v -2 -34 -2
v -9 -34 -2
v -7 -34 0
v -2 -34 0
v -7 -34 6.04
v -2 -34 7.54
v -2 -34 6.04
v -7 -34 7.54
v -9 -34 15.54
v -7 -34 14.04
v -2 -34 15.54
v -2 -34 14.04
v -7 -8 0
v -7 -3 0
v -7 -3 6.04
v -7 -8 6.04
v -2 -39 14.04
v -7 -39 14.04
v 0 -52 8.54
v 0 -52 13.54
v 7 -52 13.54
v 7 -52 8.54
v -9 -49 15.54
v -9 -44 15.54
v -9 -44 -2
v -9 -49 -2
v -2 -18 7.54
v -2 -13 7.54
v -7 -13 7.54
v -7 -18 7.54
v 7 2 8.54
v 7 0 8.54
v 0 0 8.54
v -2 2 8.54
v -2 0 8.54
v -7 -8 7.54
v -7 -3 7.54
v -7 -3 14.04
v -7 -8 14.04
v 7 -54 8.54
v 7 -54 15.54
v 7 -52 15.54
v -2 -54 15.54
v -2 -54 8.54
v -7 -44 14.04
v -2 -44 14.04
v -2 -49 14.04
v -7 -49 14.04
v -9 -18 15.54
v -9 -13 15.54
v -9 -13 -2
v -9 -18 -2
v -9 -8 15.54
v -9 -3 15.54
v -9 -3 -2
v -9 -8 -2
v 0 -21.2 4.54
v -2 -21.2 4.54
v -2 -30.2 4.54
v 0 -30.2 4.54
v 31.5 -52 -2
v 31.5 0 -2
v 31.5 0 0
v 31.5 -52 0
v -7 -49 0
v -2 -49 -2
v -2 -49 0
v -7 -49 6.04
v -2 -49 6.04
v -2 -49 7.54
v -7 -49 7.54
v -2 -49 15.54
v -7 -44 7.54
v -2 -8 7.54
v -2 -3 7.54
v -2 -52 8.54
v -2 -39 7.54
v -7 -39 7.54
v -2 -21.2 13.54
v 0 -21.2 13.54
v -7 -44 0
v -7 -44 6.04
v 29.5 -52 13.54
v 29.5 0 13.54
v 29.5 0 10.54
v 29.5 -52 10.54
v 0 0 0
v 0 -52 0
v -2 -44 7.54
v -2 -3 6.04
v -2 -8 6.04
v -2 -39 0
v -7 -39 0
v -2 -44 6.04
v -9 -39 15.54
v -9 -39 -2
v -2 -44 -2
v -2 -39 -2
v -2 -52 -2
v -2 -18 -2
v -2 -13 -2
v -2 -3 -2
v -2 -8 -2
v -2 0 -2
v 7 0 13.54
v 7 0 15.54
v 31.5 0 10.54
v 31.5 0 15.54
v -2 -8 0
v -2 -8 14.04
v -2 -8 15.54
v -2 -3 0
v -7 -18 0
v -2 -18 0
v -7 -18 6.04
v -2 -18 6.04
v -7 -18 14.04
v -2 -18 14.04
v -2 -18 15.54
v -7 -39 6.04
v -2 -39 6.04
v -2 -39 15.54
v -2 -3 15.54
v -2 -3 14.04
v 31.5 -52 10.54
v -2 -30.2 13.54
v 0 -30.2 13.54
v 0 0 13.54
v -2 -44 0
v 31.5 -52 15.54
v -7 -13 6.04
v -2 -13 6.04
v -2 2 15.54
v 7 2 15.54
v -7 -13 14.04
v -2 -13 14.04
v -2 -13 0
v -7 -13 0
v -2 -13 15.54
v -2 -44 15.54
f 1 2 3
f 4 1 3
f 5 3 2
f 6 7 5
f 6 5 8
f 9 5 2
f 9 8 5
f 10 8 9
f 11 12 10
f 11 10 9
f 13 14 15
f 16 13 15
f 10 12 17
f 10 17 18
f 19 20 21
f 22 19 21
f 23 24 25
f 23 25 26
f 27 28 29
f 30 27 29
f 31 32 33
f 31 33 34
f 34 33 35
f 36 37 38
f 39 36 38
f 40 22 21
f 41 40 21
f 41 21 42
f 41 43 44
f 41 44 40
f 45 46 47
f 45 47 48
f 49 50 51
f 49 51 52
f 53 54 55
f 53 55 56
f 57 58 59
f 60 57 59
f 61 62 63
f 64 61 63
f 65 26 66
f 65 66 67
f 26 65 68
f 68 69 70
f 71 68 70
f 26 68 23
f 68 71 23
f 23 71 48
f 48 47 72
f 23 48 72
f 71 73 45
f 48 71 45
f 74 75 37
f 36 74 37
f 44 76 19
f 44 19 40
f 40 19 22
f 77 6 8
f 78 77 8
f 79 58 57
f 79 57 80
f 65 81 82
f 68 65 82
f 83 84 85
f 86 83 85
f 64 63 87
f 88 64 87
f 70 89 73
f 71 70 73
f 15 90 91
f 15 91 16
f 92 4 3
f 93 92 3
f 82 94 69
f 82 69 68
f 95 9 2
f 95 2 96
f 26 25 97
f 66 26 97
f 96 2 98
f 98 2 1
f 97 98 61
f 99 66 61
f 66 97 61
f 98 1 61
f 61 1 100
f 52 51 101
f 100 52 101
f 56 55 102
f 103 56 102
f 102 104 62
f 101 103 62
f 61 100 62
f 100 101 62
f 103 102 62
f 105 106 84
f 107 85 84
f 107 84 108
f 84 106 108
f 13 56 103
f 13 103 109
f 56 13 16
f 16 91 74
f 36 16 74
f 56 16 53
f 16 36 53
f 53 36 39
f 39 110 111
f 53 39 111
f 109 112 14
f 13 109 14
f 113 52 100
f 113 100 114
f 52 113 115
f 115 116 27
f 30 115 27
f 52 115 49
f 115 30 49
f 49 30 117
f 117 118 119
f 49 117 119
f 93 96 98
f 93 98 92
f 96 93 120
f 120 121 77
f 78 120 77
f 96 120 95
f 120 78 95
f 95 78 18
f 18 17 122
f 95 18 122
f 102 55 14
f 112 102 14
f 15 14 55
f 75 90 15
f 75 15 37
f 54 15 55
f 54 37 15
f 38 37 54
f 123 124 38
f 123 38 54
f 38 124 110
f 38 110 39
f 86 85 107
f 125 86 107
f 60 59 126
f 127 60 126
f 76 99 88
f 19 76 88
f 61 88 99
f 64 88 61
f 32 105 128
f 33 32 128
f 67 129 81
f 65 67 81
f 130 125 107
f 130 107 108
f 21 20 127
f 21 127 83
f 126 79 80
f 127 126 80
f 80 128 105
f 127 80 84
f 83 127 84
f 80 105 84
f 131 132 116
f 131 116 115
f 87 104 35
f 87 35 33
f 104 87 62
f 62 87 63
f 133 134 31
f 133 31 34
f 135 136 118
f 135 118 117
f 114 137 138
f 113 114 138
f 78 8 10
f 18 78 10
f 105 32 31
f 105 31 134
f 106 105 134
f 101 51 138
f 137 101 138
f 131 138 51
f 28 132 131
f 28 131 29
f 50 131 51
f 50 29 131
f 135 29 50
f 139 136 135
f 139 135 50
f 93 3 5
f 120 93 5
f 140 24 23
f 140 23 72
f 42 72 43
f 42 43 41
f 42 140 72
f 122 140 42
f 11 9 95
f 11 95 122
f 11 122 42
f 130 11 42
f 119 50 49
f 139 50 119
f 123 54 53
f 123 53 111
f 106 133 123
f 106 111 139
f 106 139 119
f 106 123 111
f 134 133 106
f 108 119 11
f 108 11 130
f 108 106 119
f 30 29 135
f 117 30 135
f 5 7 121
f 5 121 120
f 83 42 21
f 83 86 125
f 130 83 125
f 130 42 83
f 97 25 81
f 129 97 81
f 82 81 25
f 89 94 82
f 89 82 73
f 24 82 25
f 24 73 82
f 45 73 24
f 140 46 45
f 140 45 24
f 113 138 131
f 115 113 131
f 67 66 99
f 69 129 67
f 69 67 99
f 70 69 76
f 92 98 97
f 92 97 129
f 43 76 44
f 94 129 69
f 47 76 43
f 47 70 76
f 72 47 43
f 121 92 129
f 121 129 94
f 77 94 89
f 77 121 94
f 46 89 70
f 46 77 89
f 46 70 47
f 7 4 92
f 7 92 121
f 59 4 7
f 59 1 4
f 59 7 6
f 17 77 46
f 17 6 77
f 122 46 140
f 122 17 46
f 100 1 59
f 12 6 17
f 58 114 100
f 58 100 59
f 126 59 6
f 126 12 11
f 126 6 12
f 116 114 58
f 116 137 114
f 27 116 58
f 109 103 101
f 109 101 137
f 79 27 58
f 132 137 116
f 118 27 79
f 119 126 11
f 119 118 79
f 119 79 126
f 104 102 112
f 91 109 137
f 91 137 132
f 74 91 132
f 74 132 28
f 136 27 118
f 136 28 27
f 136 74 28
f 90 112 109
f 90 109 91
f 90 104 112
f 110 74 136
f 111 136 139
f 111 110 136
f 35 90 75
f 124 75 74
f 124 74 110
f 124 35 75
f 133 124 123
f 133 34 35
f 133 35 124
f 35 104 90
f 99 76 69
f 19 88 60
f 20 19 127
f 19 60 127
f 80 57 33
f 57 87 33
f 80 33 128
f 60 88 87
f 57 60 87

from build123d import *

# Parameters (mm, degrees)
F1_DEPTH  = 52
F2_W      = 9
F2_H      = 9
F3_DEPTH  = 2
F5_W      = 9
F5_H      = 7
F6_DEPTH  = 2
F7_W      = 9
F7_H      = 7
F8_DEPTH  = 2
F4_W      = 5
F4_H      = 17.54
F9_DEPTH  = 7
F10_W     = 5
F10_H     = 6.5
F10_H_2   = 6.04
F11_DEPTH = 51.001


with BuildPart() as f1:
    # F0 (on Front) → F1 (new body)
    with BuildSketch(Plane.XZ):
        Polygon((31.5, 0), (0, 0), (0, 13.54), (29.5, 13.54), (29.5, 10.54), (31.5, 10.54), (31.5, 15.54), (-2, 15.54), (-2, -2), (31.5, -2), align=None)
    extrude(amount=F1_DEPTH)

    # F2 (on face) → F3 (cut, through all)
    with BuildSketch(Plane(origin=(-2, 0, 0), x_dir=(0, -1, 0), z_dir=(-1, 0, 0))):
        with Locations((25.7, 9.04)):
            Rectangle(F2_W, F2_H)
    extrude(amount=-F3_DEPTH, mode=Mode.SUBTRACT)

    # F5 (on face) → F6 (join)
    with BuildSketch(Plane(origin=(0, 0, 0), x_dir=(-1, 0, 0), z_dir=(0, 1, 0))):
        with Locations((-2.5, 12.04)):
            Rectangle(F5_W, F5_H)
    extrude(amount=F6_DEPTH)

    # F7 (on face) → F8 (join)
    with BuildSketch(Plane.XZ.offset(52)):
        with Locations((2.5, 12.04)):
            Rectangle(F7_W, F7_H)
    extrude(amount=F8_DEPTH)

    # F4 (on face) → F9 (join)
    with BuildSketch(Plane(origin=(-2, 0, 0), x_dir=(0, -1, 0), z_dir=(-1, 0, 0))):
        with Locations((15.5, 6.77)):
            Rectangle(F4_W, F4_H)
        with Locations((5.5, 6.77)):
            Rectangle(F4_W, F4_H)
        with Locations((36.5, 6.77)):
            Rectangle(F4_W, F4_H)
        with Locations((46.5, 6.77)):
            Rectangle(F4_W, F4_H)
    extrude(amount=F9_DEPTH)

    # F10 (on face) → F11 (cut, through all)
    with BuildSketch(Plane(origin=(0, -3, 0), x_dir=(-1, 0, 0), z_dir=(0, 1, 0))):
        with Locations((4.5, 10.79)):
            Rectangle(F10_W, F10_H)
        with Locations((4.5, 3.02)):
            Rectangle(F10_W, F10_H_2)
    extrude(amount=-F11_DEPTH, mode=Mode.SUBTRACT)


solid = f1.part
